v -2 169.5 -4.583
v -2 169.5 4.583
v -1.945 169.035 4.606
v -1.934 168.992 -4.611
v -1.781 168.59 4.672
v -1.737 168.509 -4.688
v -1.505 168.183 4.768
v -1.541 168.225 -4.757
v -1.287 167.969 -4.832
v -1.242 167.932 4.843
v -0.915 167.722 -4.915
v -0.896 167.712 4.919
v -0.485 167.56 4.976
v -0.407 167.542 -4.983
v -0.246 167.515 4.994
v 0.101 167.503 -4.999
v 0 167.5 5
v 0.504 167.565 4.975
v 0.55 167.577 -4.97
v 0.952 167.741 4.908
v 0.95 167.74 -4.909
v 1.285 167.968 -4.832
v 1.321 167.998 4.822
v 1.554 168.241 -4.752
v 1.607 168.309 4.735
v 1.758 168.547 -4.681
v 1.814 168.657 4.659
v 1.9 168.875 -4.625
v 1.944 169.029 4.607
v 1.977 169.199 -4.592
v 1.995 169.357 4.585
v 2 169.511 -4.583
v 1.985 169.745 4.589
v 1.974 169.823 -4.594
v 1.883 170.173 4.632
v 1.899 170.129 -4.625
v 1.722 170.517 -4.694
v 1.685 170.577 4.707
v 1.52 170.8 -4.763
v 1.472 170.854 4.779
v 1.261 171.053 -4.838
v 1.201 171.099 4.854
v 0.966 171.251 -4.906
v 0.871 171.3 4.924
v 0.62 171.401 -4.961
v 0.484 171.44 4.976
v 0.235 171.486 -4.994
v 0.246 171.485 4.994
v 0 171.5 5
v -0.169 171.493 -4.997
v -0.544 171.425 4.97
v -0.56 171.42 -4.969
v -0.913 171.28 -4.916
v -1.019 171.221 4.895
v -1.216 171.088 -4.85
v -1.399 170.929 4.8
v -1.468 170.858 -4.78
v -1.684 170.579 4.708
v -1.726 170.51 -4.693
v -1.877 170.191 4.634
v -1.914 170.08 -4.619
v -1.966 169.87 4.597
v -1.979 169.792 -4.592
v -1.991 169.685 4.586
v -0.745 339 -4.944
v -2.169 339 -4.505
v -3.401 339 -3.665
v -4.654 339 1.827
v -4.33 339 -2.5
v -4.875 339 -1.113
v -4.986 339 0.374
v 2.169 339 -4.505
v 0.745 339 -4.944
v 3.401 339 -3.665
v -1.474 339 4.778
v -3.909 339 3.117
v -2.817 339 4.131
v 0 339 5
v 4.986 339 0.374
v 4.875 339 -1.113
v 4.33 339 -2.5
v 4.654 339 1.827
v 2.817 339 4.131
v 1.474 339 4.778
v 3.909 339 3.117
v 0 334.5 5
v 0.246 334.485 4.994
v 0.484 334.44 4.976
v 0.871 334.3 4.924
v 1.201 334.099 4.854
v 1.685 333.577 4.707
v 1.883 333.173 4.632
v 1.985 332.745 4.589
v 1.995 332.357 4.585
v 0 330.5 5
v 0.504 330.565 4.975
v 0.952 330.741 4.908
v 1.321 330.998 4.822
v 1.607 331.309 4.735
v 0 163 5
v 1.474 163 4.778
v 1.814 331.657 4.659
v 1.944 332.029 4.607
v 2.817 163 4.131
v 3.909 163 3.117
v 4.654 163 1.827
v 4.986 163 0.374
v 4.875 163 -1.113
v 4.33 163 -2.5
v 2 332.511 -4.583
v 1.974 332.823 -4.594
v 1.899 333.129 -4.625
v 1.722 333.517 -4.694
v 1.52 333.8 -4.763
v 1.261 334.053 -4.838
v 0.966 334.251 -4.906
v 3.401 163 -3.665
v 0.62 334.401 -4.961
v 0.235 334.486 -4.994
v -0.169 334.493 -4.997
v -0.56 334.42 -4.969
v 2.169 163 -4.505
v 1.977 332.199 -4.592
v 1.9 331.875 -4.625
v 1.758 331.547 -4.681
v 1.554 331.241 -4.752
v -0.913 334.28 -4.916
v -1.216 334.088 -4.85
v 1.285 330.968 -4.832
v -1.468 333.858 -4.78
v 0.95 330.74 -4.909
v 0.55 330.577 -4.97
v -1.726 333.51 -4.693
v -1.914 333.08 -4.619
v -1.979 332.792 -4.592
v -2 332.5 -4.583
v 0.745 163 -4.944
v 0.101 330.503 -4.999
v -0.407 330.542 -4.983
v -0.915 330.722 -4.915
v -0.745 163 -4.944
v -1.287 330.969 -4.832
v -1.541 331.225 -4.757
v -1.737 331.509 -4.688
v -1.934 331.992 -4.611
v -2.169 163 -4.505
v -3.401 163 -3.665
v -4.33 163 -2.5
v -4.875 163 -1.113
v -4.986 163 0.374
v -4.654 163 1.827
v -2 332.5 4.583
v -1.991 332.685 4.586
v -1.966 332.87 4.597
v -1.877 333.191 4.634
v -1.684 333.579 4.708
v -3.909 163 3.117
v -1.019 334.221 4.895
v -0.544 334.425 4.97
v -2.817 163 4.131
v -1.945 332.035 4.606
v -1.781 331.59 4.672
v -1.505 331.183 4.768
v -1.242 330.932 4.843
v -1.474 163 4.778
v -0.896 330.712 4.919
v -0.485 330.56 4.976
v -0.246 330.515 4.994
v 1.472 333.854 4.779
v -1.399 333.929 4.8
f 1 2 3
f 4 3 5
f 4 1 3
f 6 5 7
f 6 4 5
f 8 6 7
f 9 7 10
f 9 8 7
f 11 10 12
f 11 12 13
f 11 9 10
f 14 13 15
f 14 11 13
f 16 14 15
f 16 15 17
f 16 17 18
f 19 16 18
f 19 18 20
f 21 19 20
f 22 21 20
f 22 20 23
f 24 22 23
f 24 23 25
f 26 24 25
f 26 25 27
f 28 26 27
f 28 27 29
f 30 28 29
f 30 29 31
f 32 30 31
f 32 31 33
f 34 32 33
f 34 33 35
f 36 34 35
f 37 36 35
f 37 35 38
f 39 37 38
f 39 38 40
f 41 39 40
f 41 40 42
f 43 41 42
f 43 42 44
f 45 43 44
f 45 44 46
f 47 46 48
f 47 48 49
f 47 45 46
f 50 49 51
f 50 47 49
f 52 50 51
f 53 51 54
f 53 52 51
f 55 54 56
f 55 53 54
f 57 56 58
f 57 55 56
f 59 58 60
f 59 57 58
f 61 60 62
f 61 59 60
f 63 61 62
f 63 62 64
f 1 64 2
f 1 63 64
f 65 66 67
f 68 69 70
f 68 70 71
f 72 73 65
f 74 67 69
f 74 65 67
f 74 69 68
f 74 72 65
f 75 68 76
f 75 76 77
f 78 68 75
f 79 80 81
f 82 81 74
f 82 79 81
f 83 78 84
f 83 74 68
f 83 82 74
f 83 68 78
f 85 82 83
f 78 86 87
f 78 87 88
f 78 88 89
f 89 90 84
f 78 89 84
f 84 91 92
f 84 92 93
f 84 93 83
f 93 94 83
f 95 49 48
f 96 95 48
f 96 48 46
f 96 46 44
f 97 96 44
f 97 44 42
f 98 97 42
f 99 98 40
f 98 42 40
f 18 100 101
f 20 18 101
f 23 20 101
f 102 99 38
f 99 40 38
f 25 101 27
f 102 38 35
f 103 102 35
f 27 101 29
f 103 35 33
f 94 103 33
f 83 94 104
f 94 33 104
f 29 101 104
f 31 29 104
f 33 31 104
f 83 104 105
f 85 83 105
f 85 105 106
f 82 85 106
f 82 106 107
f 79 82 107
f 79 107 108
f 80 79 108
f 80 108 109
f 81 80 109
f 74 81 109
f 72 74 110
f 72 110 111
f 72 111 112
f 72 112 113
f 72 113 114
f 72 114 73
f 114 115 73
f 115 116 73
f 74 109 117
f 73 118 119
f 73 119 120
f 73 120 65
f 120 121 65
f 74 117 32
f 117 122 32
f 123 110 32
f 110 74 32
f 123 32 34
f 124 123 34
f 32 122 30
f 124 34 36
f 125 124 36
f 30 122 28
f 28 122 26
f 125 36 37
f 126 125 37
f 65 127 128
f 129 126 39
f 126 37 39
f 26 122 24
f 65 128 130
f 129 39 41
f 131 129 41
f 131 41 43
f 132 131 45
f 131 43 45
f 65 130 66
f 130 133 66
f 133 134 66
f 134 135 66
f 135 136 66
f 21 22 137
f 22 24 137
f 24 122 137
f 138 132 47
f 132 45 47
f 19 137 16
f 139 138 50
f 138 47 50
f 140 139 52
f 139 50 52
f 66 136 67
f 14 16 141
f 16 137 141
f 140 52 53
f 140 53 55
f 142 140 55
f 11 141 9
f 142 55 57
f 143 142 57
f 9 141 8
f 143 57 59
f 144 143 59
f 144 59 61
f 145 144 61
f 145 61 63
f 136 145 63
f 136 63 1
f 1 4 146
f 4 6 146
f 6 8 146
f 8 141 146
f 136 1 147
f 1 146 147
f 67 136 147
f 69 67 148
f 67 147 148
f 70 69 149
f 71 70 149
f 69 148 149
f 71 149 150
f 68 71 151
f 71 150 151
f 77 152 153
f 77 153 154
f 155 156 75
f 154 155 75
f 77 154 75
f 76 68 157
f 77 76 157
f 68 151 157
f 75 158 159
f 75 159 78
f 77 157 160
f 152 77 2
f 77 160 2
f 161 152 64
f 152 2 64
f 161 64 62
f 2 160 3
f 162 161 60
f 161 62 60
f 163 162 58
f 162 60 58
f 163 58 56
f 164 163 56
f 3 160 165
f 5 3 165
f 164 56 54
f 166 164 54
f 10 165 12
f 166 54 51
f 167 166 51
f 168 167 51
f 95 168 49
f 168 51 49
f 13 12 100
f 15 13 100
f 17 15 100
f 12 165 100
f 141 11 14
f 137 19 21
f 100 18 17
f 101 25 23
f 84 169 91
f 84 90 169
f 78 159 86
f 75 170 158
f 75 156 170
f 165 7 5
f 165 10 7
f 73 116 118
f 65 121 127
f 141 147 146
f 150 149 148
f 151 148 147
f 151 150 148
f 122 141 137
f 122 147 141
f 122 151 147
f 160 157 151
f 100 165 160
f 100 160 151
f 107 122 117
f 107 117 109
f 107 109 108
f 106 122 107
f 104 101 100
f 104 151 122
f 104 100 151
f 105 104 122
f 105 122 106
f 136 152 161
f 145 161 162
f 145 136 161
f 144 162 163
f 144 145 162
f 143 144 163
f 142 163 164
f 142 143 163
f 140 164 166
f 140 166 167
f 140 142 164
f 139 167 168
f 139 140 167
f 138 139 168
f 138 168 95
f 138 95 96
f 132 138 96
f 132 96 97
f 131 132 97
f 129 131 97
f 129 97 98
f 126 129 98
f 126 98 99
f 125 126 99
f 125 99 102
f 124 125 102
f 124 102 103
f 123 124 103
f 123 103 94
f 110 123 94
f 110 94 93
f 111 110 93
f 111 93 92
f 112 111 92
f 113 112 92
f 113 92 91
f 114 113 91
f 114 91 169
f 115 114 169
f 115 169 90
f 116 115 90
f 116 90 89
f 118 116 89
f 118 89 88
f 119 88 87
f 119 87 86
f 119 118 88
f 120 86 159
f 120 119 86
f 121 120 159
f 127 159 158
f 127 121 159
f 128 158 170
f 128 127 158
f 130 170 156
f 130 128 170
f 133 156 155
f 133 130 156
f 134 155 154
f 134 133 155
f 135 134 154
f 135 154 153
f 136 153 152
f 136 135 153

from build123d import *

# Parameters (mm, degrees)
CROQUIS1_R                 = 5
SALIENTE_EXTRUIR1_DEPTH    = 339
CROQUIS8_R                 = 6.285812581
CORTAR_EXTRUIR5_DEPTH      = 163
CORTAR_EXTRUIR6_DEPTH      = 10
CORTAR_EXTRUIR6_DEPTH_BACK = 10
CROQUIS9_R                 = 2
CORTAR_EXTRUIR7_DEPTH      = 10
CORTAR_EXTRUIR7_DEPTH_BACK = 10
CROQUIS10_R                = 2


with BuildPart() as part:
    # Croquis1 → Saliente-Extruir1 (new body)
    with BuildSketch(Plane(origin=(0, 0, 0), x_dir=(1, 0, 0), z_dir=(0, 1, 0))):
        Circle(CROQUIS1_R)
    extrude(amount=SALIENTE_EXTRUIR1_DEPTH)

    # Croquis8 → Cortar-Extruir5 (cut)
    with BuildSketch(Plane.XZ):
        Circle(CROQUIS8_R)
    extrude(amount=-CORTAR_EXTRUIR5_DEPTH, mode=Mode.SUBTRACT)

    # Croquis9 → Cortar-Extruir6 (cut, two sides: drawn at the far end of the back side and taken through both)
    with BuildSketch(Plane.XY.offset(-CORTAR_EXTRUIR6_DEPTH_BACK)):
        with Locations((0, 332.5)):
            Circle(CROQUIS9_R)
    extrude(amount=CORTAR_EXTRUIR6_DEPTH + CORTAR_EXTRUIR6_DEPTH_BACK, mode=Mode.SUBTRACT)

    # Croquis10 → Cortar-Extruir7 (cut, two sides: drawn at the far end of the back side and taken through both)
    with BuildSketch(Plane.XY.offset(-CORTAR_EXTRUIR7_DEPTH_BACK)):
        with Locations((0, 169.5)):
            Circle(CROQUIS10_R)
    extrude(amount=CORTAR_EXTRUIR7_DEPTH + CORTAR_EXTRUIR7_DEPTH_BACK, mode=Mode.SUBTRACT)


solid = part.part
